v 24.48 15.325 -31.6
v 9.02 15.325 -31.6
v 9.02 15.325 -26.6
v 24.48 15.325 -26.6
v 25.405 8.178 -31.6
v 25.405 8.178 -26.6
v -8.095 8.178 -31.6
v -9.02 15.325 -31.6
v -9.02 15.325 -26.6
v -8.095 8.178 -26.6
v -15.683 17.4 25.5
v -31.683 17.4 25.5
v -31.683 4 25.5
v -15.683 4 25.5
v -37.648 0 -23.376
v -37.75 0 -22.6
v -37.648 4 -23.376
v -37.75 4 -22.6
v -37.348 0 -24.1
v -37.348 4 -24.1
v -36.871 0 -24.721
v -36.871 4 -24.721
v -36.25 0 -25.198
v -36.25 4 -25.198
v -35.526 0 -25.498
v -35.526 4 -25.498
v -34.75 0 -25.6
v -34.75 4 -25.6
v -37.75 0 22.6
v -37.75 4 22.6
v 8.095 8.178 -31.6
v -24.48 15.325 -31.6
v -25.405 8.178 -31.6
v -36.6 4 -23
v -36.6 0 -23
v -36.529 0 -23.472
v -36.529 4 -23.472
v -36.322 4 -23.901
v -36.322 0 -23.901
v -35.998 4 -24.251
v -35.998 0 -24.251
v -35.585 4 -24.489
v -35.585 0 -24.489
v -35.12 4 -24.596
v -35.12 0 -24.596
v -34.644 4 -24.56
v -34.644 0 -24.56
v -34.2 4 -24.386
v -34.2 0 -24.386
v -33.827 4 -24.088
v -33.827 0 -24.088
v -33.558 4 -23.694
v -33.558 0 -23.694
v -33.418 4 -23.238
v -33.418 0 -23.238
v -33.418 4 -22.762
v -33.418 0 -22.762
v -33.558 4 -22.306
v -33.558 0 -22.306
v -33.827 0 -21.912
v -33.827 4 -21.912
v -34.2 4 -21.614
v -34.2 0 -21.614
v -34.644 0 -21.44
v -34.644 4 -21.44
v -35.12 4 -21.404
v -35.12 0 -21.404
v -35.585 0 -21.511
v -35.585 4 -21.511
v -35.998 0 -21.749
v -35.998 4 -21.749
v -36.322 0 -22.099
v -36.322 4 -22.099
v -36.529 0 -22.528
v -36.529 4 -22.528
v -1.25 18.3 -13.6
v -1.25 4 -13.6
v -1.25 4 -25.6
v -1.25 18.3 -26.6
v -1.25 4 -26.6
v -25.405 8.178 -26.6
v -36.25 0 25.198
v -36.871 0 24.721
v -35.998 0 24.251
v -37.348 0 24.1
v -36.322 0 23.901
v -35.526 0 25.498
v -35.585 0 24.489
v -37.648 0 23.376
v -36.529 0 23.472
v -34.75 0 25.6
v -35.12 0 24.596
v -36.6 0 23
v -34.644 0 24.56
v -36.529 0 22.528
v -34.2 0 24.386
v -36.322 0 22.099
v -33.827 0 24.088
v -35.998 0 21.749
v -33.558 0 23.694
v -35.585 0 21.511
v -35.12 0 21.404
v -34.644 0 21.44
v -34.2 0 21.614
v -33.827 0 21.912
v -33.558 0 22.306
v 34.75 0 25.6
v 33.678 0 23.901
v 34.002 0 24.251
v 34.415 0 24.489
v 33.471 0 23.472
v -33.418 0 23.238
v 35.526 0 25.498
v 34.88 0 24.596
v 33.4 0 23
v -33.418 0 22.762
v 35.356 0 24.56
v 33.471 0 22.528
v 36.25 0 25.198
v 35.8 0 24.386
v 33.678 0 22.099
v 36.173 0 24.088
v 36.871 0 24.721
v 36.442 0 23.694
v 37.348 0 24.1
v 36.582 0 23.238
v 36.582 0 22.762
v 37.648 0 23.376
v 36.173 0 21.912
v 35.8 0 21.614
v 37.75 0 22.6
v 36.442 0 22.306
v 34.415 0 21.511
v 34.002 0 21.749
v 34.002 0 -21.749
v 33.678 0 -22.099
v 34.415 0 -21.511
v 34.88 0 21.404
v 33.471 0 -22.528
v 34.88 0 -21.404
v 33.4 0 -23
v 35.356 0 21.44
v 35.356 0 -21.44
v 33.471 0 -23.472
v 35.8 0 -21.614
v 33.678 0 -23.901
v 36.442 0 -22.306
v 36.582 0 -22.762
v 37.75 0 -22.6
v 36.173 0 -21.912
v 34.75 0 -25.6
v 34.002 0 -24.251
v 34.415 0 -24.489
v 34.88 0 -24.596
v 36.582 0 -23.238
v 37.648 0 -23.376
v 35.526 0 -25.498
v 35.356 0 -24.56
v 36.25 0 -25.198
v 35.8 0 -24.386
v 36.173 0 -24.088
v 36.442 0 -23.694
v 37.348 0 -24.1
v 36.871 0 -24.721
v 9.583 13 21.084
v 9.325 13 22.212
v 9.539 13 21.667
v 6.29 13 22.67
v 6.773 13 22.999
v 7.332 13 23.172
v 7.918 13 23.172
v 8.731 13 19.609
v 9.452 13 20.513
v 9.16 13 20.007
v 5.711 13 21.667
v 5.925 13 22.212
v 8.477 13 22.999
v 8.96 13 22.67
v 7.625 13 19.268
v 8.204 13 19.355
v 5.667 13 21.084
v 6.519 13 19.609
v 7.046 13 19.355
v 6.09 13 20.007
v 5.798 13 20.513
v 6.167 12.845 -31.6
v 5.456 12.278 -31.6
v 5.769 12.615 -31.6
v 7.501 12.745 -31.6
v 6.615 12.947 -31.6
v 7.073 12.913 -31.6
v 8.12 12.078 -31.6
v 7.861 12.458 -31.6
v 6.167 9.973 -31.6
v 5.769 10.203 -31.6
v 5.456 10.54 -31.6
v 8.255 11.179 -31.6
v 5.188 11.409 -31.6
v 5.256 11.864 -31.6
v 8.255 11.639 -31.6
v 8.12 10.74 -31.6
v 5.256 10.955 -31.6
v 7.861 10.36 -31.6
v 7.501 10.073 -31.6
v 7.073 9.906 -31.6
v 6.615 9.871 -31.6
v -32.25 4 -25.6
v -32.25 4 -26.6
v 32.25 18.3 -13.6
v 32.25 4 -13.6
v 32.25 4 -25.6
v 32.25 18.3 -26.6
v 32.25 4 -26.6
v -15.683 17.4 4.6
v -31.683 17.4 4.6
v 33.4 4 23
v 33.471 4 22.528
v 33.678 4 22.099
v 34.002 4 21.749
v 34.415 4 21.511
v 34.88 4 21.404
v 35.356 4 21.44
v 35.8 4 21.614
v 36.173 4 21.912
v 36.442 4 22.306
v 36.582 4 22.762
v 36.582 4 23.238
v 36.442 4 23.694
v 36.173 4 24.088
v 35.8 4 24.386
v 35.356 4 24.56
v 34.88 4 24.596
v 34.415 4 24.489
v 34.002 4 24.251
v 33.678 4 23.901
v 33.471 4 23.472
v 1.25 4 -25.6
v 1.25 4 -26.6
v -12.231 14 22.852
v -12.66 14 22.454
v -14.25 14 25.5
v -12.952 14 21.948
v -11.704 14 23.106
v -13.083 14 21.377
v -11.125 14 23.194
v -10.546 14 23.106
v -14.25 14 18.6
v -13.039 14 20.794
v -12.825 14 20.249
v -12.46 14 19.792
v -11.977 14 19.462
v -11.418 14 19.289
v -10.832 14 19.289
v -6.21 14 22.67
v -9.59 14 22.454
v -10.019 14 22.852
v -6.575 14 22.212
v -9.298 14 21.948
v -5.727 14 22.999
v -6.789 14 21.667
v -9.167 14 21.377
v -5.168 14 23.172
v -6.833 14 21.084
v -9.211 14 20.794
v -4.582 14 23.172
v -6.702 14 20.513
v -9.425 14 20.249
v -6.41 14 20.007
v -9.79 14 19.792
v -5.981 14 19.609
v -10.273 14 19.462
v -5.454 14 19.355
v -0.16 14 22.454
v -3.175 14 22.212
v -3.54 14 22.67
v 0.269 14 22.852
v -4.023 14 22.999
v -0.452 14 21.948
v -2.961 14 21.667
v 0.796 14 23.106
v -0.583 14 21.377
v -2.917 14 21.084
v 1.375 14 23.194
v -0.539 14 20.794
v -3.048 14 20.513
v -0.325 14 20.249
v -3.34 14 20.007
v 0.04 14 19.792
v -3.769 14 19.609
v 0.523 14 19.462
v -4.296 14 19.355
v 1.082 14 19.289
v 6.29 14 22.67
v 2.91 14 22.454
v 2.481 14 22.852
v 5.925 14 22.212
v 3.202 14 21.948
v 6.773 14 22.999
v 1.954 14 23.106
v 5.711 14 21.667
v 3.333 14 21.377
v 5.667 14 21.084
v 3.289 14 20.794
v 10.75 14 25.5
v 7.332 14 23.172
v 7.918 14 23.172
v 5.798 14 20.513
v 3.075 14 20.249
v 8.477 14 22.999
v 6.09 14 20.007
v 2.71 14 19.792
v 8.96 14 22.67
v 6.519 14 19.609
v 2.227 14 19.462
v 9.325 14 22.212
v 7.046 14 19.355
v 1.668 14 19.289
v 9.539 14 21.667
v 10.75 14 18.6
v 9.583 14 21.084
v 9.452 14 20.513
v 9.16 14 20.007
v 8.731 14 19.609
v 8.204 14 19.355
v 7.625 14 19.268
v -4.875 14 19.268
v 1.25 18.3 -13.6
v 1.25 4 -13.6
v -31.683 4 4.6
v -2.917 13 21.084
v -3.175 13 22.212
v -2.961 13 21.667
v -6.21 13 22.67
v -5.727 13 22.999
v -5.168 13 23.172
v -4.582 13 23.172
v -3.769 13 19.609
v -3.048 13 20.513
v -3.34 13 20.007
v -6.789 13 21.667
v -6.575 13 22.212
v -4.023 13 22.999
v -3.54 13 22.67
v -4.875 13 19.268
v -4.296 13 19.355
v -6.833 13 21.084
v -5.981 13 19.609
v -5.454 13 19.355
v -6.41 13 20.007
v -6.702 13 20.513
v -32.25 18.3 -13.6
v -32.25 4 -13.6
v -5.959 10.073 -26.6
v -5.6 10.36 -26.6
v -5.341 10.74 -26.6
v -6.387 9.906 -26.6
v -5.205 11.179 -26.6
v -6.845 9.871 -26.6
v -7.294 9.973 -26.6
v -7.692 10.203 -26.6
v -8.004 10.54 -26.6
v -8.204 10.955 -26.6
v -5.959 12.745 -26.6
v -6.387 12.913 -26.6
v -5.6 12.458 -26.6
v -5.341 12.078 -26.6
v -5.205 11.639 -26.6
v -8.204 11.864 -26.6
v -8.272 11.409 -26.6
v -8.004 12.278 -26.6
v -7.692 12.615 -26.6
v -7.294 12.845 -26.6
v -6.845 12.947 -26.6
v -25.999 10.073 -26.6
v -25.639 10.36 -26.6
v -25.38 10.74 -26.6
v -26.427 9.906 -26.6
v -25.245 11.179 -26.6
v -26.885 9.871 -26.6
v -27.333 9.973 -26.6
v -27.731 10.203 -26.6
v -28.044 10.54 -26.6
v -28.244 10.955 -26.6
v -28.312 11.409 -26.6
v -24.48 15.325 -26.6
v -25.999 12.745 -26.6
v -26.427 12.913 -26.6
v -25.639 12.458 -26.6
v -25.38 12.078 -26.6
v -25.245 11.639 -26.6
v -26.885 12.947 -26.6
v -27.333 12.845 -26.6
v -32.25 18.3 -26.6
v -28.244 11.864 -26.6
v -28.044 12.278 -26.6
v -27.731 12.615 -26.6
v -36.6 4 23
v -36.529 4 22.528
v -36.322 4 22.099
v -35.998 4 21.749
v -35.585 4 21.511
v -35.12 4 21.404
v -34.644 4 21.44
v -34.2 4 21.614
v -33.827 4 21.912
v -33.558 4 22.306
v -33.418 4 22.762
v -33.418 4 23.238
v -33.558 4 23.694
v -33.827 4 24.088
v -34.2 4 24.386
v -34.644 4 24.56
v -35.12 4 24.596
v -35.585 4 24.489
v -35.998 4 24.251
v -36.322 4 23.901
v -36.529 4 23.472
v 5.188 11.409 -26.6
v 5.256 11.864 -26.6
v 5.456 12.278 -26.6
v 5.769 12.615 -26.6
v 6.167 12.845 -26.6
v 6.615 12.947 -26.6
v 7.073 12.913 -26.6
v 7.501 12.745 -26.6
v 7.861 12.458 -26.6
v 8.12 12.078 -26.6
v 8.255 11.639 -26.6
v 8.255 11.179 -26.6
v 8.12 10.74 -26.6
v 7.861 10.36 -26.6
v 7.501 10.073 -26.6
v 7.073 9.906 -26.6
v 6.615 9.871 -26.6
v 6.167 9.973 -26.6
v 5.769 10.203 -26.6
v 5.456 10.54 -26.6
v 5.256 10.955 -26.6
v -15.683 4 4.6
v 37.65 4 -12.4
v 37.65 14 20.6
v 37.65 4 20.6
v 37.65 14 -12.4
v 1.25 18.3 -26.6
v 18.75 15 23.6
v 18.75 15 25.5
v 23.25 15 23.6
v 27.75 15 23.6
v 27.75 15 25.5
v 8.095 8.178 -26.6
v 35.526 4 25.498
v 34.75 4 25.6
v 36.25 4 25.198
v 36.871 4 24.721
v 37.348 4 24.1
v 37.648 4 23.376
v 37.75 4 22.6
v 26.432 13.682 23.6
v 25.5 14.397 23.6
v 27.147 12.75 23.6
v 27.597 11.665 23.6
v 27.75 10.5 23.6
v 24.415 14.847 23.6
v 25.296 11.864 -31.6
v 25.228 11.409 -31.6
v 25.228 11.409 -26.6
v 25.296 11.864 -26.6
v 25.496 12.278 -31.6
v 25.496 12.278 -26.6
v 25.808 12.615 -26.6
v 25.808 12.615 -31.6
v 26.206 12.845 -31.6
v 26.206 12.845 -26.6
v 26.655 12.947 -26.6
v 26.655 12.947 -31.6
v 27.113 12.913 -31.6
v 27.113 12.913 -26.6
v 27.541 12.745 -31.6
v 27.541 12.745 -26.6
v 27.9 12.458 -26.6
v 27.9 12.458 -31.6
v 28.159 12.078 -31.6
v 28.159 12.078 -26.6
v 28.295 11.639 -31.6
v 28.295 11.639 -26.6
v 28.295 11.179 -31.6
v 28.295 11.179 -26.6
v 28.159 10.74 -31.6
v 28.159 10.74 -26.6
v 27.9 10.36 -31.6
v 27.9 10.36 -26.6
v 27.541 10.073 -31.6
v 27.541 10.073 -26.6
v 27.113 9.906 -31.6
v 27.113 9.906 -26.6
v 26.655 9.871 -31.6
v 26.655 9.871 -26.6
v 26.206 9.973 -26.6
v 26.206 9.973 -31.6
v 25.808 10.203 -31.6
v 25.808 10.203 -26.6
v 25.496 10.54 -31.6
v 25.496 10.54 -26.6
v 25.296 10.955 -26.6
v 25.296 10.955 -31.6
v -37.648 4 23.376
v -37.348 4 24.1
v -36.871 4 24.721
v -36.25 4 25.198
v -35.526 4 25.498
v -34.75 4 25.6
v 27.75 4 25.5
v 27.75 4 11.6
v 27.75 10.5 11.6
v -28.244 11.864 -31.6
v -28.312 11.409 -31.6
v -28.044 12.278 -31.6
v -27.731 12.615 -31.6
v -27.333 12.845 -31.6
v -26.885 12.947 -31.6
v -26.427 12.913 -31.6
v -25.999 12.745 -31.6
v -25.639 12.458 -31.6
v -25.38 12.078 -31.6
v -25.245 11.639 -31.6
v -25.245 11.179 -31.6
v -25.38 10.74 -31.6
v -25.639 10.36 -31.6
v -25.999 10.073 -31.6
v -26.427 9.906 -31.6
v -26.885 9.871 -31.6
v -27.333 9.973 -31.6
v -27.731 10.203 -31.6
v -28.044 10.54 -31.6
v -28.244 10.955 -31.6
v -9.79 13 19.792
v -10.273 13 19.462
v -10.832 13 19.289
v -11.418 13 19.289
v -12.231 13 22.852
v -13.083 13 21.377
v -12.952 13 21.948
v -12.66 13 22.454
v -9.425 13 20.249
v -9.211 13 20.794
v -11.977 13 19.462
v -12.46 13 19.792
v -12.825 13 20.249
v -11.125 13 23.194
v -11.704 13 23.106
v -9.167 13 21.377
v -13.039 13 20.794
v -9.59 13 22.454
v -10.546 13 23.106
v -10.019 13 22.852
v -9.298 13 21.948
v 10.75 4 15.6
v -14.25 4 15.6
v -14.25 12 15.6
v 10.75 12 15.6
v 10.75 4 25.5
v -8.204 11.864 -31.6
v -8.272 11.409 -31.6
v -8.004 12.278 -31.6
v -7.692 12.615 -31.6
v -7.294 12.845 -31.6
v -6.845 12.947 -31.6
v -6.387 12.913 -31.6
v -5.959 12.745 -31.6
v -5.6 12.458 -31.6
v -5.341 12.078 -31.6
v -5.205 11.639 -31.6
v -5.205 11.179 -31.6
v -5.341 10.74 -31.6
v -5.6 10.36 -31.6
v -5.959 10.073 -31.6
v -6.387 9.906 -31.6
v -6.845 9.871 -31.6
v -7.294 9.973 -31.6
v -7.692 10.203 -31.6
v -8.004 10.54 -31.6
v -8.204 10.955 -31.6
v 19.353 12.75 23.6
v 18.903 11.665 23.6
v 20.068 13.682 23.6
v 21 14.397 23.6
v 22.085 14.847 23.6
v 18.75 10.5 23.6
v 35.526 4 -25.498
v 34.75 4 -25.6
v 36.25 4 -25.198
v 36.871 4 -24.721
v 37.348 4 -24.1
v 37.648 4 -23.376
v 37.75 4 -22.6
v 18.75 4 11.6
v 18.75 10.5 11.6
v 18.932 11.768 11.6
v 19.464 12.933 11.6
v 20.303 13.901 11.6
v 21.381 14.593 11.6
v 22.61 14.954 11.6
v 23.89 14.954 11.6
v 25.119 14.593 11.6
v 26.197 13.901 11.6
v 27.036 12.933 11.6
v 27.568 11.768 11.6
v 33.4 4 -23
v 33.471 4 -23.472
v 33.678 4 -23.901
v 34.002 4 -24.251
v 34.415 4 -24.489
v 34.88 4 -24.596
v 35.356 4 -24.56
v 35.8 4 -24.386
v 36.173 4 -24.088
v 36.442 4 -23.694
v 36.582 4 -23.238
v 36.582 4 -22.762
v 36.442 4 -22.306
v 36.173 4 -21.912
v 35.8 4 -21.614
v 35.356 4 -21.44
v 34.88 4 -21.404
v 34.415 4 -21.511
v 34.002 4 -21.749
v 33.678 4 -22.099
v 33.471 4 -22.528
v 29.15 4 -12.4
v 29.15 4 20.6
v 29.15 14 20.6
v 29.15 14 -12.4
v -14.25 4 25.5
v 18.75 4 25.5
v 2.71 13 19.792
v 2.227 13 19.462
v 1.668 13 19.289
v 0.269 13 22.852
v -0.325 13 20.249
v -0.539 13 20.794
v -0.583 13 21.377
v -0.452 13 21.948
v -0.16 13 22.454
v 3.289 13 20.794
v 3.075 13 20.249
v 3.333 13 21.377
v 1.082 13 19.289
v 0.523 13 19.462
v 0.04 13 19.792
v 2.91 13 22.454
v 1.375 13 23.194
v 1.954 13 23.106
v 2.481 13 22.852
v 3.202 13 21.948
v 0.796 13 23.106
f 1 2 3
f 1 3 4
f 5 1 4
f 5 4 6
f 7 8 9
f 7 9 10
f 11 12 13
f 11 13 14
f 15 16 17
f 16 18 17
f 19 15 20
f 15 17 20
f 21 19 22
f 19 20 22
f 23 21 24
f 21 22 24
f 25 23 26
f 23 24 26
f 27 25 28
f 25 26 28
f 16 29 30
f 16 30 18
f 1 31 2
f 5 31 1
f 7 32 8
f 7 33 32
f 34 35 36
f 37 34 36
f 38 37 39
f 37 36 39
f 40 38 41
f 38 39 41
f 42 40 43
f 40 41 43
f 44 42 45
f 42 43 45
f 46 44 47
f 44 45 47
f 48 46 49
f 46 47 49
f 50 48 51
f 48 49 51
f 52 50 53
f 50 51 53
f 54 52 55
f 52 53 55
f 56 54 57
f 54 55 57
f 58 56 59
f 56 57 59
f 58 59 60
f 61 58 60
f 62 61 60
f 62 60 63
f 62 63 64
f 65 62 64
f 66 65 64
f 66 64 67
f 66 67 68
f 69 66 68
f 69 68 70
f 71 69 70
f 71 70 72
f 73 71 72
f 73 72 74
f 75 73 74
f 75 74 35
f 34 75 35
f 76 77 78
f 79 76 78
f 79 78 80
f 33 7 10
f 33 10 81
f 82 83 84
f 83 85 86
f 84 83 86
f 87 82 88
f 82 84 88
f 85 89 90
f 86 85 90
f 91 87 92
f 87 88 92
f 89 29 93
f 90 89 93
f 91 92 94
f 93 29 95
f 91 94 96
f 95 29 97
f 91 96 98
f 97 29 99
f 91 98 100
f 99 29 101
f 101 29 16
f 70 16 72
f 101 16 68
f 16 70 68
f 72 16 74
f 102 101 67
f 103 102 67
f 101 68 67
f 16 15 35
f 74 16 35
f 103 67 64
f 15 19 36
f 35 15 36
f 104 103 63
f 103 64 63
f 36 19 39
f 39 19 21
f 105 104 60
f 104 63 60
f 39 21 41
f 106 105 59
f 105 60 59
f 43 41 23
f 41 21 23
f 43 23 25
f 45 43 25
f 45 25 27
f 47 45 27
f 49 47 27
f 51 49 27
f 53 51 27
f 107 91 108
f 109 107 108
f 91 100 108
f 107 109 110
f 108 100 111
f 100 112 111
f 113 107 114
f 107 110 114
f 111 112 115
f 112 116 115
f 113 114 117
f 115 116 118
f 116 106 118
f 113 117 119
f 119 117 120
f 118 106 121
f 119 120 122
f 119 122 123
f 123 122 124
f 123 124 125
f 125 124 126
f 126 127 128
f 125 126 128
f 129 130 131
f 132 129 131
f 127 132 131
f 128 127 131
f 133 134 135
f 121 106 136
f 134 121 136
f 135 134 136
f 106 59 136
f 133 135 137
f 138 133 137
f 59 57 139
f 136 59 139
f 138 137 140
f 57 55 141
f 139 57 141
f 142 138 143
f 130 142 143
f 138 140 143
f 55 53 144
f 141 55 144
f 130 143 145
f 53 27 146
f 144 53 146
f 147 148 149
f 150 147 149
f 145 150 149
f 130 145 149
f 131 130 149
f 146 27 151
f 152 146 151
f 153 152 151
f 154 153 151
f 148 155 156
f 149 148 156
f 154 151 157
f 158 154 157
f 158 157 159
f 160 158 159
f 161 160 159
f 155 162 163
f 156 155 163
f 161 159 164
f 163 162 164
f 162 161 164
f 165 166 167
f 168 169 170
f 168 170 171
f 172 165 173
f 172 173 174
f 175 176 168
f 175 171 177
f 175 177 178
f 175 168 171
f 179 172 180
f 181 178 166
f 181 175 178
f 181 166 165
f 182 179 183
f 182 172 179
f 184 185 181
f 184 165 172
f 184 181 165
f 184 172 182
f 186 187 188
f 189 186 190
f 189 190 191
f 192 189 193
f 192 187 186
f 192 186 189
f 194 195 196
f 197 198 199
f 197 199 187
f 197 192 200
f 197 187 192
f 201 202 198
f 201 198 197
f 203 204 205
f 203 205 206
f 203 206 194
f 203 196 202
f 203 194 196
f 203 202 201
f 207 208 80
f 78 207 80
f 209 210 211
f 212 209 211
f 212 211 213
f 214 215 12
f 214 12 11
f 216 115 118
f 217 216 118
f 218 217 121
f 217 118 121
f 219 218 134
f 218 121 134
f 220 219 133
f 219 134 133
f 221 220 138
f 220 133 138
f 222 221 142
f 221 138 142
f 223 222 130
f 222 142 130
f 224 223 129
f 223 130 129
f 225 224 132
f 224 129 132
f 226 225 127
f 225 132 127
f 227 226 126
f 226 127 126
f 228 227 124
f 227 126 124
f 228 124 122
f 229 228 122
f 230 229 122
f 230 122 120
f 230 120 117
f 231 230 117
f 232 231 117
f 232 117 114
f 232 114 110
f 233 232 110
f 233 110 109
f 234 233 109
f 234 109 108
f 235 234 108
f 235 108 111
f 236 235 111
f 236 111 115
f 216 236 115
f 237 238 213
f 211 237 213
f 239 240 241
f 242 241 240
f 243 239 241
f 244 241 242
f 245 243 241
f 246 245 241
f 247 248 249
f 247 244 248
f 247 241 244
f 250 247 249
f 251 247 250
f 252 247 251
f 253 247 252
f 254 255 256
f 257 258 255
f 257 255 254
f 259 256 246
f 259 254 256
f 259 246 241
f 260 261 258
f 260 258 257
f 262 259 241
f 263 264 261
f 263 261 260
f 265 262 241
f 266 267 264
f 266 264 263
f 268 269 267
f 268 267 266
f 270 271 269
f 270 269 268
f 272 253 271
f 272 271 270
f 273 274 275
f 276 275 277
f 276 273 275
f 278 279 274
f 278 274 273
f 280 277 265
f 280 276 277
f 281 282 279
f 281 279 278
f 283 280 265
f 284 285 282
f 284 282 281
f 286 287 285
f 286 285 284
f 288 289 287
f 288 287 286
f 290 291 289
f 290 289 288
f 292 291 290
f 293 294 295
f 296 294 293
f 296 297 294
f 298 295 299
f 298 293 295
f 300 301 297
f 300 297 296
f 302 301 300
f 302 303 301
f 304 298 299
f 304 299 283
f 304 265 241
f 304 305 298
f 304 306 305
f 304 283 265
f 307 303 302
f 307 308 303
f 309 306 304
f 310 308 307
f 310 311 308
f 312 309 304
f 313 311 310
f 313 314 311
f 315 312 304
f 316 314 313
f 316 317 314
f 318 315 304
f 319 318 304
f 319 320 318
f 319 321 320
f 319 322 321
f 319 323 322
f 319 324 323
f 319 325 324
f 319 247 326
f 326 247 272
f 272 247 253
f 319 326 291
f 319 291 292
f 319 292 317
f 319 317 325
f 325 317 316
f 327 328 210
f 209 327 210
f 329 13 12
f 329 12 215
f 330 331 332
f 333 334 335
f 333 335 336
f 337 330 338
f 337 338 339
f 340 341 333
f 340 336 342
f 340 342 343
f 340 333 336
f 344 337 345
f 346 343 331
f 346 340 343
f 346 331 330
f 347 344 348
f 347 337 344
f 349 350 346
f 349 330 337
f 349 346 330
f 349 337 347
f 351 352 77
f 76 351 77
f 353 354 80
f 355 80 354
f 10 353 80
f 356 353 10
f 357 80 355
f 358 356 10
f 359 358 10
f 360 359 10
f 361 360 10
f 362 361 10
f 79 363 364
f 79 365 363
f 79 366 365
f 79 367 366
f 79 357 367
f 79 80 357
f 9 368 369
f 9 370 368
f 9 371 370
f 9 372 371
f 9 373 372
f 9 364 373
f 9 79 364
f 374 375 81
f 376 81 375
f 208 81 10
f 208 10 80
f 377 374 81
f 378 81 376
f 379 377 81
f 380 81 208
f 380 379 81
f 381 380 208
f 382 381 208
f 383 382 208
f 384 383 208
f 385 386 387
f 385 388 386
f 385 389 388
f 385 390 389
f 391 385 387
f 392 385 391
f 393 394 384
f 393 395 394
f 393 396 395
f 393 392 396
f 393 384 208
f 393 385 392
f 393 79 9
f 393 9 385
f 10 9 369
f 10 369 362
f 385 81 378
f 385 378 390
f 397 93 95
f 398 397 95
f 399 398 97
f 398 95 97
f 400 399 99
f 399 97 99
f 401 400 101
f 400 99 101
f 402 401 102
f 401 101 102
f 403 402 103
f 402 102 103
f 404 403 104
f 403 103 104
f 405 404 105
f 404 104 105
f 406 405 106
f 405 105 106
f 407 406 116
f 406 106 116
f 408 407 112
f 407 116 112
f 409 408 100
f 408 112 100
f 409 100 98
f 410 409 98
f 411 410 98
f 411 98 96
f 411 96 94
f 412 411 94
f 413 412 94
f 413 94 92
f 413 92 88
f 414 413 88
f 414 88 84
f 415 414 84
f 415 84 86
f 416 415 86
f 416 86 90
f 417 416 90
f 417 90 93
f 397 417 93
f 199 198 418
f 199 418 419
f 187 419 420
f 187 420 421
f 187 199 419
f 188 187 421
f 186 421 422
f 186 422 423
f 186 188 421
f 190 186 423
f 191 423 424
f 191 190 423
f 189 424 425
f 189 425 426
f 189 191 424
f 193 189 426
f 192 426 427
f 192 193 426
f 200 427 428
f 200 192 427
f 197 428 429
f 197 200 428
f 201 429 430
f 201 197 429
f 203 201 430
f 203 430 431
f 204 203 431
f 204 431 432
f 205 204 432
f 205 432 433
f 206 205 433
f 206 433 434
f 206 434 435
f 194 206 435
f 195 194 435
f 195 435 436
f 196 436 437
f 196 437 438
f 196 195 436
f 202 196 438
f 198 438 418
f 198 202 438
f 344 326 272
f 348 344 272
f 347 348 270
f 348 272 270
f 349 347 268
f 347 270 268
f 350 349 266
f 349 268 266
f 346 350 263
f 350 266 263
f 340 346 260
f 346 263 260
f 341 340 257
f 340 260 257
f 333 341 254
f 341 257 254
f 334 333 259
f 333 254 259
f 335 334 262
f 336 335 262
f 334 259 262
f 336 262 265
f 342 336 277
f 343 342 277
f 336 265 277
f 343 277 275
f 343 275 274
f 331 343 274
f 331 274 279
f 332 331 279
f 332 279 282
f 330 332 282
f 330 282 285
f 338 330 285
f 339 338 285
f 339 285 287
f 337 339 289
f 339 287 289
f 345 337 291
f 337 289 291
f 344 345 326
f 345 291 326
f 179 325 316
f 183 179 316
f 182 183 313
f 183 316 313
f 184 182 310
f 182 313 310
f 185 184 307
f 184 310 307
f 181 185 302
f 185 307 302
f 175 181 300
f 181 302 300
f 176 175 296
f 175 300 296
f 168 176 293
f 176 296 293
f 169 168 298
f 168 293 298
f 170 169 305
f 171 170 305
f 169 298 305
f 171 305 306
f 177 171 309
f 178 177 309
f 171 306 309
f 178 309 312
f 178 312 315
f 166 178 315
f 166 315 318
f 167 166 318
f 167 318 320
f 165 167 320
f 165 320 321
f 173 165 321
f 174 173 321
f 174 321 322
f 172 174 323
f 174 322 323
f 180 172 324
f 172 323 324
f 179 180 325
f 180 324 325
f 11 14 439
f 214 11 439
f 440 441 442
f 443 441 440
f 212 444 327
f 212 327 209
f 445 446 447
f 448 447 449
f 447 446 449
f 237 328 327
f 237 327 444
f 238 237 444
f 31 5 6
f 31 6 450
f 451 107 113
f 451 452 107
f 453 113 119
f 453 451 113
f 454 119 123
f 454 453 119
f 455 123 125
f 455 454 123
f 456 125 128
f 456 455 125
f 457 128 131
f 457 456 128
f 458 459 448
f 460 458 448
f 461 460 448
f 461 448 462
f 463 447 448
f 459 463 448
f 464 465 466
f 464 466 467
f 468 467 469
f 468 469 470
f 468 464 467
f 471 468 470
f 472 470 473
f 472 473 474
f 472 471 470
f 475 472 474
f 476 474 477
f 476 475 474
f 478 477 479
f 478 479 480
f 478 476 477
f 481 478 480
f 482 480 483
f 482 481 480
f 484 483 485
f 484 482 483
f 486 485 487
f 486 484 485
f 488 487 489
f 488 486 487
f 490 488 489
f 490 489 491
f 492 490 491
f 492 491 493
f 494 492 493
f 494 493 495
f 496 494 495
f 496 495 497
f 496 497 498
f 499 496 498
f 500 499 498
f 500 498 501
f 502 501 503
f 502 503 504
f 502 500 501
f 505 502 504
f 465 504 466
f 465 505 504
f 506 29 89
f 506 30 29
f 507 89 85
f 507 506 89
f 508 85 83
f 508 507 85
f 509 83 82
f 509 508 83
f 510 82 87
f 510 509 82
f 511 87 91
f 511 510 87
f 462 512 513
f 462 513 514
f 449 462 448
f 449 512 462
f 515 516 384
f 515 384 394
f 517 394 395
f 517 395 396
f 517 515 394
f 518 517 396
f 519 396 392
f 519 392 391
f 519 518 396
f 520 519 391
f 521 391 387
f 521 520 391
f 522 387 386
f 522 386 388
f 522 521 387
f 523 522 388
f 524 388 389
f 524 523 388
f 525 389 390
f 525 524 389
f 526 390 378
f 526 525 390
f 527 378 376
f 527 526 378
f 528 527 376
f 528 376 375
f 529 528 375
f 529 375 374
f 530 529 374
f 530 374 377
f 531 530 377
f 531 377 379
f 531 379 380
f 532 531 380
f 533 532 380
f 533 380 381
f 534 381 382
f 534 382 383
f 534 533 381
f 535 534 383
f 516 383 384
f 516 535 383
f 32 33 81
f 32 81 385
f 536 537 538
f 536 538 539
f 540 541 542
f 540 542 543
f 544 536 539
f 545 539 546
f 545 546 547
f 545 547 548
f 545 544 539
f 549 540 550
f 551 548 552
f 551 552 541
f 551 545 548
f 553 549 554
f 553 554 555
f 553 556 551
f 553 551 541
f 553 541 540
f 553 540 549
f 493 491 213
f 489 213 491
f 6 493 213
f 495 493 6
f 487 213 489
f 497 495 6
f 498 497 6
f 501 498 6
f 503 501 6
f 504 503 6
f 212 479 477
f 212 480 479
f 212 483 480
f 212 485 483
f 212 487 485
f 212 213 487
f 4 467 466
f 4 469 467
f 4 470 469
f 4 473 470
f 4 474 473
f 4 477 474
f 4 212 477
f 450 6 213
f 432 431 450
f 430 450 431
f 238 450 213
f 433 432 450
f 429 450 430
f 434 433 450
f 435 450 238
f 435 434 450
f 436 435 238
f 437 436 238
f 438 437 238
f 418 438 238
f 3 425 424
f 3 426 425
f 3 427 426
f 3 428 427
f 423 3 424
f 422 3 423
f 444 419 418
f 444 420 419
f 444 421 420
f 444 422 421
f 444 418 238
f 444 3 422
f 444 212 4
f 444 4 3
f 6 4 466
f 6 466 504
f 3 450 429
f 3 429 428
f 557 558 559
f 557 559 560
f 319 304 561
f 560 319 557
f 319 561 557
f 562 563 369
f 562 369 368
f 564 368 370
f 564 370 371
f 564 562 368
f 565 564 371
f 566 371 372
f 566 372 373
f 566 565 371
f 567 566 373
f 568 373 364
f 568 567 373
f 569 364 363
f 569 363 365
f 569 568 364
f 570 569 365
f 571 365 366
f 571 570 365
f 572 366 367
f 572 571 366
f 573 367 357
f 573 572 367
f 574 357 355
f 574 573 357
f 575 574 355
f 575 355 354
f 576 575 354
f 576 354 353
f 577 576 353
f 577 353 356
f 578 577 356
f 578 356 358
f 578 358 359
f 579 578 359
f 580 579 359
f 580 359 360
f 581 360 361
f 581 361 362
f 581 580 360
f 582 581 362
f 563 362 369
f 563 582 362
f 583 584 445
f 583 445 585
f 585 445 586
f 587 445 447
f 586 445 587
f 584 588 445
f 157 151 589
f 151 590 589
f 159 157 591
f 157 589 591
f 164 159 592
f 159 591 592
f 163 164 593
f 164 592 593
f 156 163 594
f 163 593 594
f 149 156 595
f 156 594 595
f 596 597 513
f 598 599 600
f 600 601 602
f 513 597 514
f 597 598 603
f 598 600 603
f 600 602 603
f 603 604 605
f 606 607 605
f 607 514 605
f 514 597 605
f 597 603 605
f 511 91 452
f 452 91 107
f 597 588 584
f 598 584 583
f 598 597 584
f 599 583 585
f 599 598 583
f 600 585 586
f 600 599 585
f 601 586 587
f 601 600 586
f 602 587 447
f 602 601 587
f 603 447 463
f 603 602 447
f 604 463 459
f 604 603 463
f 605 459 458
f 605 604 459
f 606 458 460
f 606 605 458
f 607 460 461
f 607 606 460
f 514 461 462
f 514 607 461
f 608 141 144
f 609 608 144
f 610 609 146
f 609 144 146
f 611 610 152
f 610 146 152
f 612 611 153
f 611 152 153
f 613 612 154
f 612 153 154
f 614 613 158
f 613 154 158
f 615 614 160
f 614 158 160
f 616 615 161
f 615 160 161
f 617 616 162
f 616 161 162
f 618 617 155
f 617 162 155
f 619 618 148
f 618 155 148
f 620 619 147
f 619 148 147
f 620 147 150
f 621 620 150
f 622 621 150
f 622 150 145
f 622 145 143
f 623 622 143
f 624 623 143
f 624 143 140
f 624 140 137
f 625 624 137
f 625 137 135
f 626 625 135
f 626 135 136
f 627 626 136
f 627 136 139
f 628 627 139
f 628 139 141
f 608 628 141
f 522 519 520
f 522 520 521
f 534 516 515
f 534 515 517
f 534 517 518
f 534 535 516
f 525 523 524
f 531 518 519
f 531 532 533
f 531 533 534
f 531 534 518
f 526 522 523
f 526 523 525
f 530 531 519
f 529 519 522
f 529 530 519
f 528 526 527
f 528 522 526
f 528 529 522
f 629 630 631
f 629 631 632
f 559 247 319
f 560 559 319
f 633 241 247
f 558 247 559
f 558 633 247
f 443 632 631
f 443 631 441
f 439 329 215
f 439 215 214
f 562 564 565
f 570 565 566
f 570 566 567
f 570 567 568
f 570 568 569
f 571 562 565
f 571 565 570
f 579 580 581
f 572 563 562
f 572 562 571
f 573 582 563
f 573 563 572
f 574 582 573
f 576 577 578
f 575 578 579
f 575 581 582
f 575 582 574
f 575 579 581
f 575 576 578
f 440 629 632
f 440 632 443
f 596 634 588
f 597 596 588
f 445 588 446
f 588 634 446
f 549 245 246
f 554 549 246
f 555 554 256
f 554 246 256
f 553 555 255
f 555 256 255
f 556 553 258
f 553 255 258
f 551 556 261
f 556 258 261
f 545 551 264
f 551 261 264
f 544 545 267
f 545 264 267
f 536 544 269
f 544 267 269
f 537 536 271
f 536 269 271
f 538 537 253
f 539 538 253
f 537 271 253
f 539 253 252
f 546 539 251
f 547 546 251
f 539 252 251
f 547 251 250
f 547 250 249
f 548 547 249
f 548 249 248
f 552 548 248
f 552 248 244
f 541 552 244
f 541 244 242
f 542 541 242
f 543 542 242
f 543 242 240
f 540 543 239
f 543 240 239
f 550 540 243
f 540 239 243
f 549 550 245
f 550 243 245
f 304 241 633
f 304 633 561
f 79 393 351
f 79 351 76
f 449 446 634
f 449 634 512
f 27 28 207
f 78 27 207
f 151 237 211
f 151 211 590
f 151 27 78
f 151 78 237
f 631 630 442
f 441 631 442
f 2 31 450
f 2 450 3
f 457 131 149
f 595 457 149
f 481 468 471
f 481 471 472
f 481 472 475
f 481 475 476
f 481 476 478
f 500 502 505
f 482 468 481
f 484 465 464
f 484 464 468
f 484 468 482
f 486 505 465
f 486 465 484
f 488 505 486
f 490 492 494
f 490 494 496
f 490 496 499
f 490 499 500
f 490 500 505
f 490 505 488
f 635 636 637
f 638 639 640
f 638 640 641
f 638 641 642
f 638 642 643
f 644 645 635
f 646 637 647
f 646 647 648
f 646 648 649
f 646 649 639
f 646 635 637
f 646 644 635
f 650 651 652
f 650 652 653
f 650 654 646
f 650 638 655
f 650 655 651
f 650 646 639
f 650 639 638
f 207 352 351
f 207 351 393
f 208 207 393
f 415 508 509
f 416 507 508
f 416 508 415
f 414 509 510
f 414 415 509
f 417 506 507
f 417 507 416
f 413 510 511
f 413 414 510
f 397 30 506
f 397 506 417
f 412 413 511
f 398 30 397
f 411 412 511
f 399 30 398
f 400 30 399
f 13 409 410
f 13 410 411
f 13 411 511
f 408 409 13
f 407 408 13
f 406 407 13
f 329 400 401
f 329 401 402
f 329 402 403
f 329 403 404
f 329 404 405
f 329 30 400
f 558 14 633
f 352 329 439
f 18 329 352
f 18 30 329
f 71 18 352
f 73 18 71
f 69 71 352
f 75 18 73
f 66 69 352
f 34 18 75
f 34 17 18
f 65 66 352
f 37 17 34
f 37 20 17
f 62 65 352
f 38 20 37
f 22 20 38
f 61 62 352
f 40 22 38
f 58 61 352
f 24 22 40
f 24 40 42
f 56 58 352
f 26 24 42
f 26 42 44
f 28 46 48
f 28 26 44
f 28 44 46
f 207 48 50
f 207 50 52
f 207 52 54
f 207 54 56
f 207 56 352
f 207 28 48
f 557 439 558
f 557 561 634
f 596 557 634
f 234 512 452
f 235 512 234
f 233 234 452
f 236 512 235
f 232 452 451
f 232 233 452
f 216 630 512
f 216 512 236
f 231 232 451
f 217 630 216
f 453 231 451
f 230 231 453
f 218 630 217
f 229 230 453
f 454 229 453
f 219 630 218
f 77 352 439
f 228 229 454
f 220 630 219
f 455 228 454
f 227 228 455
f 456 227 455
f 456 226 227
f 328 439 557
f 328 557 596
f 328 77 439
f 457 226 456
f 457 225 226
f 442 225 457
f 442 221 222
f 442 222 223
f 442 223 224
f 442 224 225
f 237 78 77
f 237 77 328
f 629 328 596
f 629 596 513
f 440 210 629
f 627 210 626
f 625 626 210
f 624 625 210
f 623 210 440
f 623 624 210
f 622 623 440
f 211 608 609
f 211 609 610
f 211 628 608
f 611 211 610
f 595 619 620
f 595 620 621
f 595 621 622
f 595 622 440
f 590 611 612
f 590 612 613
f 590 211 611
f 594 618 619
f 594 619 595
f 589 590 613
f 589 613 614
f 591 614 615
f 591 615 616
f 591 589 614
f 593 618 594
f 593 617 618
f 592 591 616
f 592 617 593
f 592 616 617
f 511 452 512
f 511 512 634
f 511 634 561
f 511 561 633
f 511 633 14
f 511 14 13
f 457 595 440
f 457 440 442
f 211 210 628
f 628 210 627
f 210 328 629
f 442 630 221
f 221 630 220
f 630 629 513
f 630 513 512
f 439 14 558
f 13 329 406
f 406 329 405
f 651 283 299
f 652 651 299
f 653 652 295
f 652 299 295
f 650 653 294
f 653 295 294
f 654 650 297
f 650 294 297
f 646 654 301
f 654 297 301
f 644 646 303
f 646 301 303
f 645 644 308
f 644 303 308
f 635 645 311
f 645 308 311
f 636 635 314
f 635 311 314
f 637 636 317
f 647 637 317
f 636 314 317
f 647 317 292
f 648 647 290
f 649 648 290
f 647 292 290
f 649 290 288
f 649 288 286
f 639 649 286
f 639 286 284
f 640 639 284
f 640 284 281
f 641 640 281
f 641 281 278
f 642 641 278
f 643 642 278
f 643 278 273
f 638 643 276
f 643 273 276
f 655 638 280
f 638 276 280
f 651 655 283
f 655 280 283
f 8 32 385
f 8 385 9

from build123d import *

# Parameters (mm, degrees)
SKETCH_1_W          = 75.5
SKETCH_1_H          = 51.2
EXTRUDE_1_DEPTH     = 4
HOLE_WIZARD_M3_1_D  = 3.2
FILLET_1_R          = 3
SKETCH_4_W          = 9
SKETCH_4_H          = 11
EXTRUDE_2_DEPTH     = 14
CUT_EXTRUDE_1_DEPTH = 12
SKETCH_6_W          = 25
SKETCH_6_H          = 10
EXTRUDE_3_DEPTH     = 10
SKETCH_7_R          = 1.963016799
CUT_EXTRUDE_2_DEPTH = 1
CHAMFER_1_SIZE      = 2
CHAMFER_1_SIZE2     = 3
SKETCH_8_W          = 8.6
SKETCH_8_H          = 33
EXTRUDE_4_DEPTH     = 10
SKETCH_9_W          = 31
SKETCH_9_H          = 18
EXTRUDE_5_DEPTH     = 14.3
SKETCH_10_W         = 31
SKETCH_10_H         = 14.3
SKETCH_10_R         = 1.542197262
CUT_EXTRUDE_3_DEPTH = 5
SKETCH_11_W         = 16
SKETCH_11_H         = 21
EXTRUDE_6_DEPTH     = 13.4
SKETCH_12_W         = 59.433168898
SKETCH_12_H         = 13.4
CUT_EXTRUDE_4_DEPTH = 0.1
SKETCH_13_W         = 33
SKETCH_13_H         = 10
CUT_EXTRUDE_5_DEPTH = 0.1


with BuildPart() as part:
    # 草图1 → 凸台-拉伸1 (new body)
    with BuildSketch(Plane(origin=(0, 0, 0), x_dir=(1, 0, 0), z_dir=(0, 1, 0))):
        Rectangle(SKETCH_1_W, SKETCH_1_H)
    extrude(amount=EXTRUDE_1_DEPTH)

    # M3 间隙孔1 (through all)
    with Locations(Plane(origin=(0, 4, 0), x_dir=(1, 0, 0), z_dir=(0, 1, 0))):
        with Locations((-35, 23), (35, 23), (-35, -23), (35, -23)):
            Hole(HOLE_WIZARD_M3_1_D / 2)

    # 圆角1
    fillet_1_edges = [part.edges().sort_by_distance(p)[0] for p in [
        (-37.75, 2, -25.6),
        (37.75, 2, -25.6),
        (37.75, 2, 25.6),
        (-37.75, 2, 25.6),
    ]]
    fillet(fillet_1_edges, radius=FILLET_1_R)

    # 草图4 → 凸台-拉伸2 (add)
    with BuildSketch(Plane.XY.offset(25.6)):
        with Locations((23.25, 9.5)):
            Rectangle(SKETCH_4_W, SKETCH_4_H)
    extrude(amount=-EXTRUDE_2_DEPTH)

    # 草图5 → 切除-拉伸1 (cut)
    with BuildSketch(Plane(origin=(0, 0, 11.6), x_dir=(-1, 0, 0), z_dir=(0, 0, -1))):
        with BuildLine():
            Line((-27.75, 10.5), (-28.75, 10.5))
            Line((-28.75, 10.5), (-28.75, 16))
            Line((-28.75, 16), (-17.75, 16))
            Line((-17.75, 16), (-17.75, 10.5))
            Line((-17.75, 10.5), (-18.75, 10.5))
            ThreePointArc((-18.75, 10.5), (-23.25, 15), (-27.75, 10.5))
        make_face()
    extrude(amount=-CUT_EXTRUDE_1_DEPTH, mode=Mode.SUBTRACT)

    # 草图6 → 凸台-拉伸3 (add)
    with BuildSketch(Plane(origin=(0, 4, 0), x_dir=(1, 0, 0), z_dir=(0, 1, 0))):
        with Locations((-1.75, -20.6)):
            Rectangle(SKETCH_6_W, SKETCH_6_H)
    extrude(amount=EXTRUDE_3_DEPTH)

    # 草图7 → 切除-拉伸2 (cut)
    with BuildSketch(Plane(origin=(0, 14, 0), x_dir=(1, 0, 0), z_dir=(0, 1, 0))):
        with Locations(Location((-11.125, -21.230534839, 0), (0, 0, 270))):
            Circle(SKETCH_7_R)
        with Locations(Location((-4.875, -21.230534839, 0), (0, 0, 90))):
            Circle(SKETCH_7_R)
        with Locations(Location((7.625, -21.230534839, 0), (0, 0, 90))):
            Circle(SKETCH_7_R)
        with Locations(Location((1.375, -21.230534839, 0), (0, 0, 270))):
            Circle(SKETCH_7_R)
    extrude(amount=-CUT_EXTRUDE_2_DEPTH, mode=Mode.SUBTRACT)

    # 倒角1
    chamfer_1_edges = [part.edges().sort_by_distance(p)[0] for p in [
        (-1.75, 14, 15.6),
    ]]
    chamfer_1_side = [part.faces().sort_by_distance(p)[0] for p in [
        (-1.75, 9, 15.6),
    ]]
    chamfer(chamfer_1_edges, length=CHAMFER_1_SIZE, length2=CHAMFER_1_SIZE2, reference=chamfer_1_side[0])

    # 草图8 → 凸台-拉伸4 (add)
    with BuildSketch(Plane(origin=(0, 4, 0), x_dir=(1, 0, 0), z_dir=(0, 1, 0))):
        with Locations((33.45, -4.1)):
            Rectangle(SKETCH_8_W, SKETCH_8_H)
    extrude(amount=EXTRUDE_4_DEPTH)

    # 草图9 → 凸台-拉伸5 (add)
    with BuildSketch(Plane(origin=(0, 4, 0), x_dir=(1, 0, 0), z_dir=(0, 1, 0))):
        with Locations((-16.75, 22.6)):
            Rectangle(SKETCH_9_W, SKETCH_9_H)
        with Locations((16.75, 22.6)):
            Rectangle(SKETCH_9_W, SKETCH_9_H)
    extrude(amount=EXTRUDE_5_DEPTH)

    # 草图10 → 切除-拉伸3 (cut)
    # profile 1 of 2: a face of its own
    with BuildSketch(Plane(origin=(0, 0, -31.6), x_dir=(-1, 0, 0), z_dir=(0, 0, -1))):
        with Locations((-16.75, 11.15)):
            Rectangle(SKETCH_10_W, SKETCH_10_H)
        with Locations((-26.769914648, 11.409080509)):
            Circle(SKETCH_10_R, mode=Mode.SUBTRACT)
        with Locations((-6.730085352, 11.409080509)):
            Circle(SKETCH_10_R, mode=Mode.SUBTRACT)
        Polygon((-25.404607637, 8.177619476), (-8.095392363, 8.177619476), (-9.020301502, 15.325154661), (-24.479698498, 15.325154661), align=None, mode=Mode.SUBTRACT)
    # profile 2 of 2: a face of its own
    with BuildSketch(Plane(origin=(0, 0, -31.6), x_dir=(-1, 0, 0), z_dir=(0, 0, -1))):
        with Locations((16.75, 11.15)):
            Rectangle(SKETCH_10_W, SKETCH_10_H)
        with Locations((6.730085352, 11.409080509)):
            Circle(SKETCH_10_R, mode=Mode.SUBTRACT)
        with Locations((26.769914648, 11.409080509)):
            Circle(SKETCH_10_R, mode=Mode.SUBTRACT)
        Polygon((9.020301502, 15.325154661), (8.095392363, 8.177619476), (25.404607637, 8.177619476), (24.479698498, 15.325154661), align=None, mode=Mode.SUBTRACT)
    extrude(amount=-CUT_EXTRUDE_3_DEPTH, mode=Mode.SUBTRACT)

    # 草图11 → 凸台-拉伸6 (add)
    with BuildSketch(Plane(origin=(0, 4, 0), x_dir=(1, 0, 0), z_dir=(0, 1, 0))):
        with Locations((-23.683168898, -15.1)):
            Rectangle(SKETCH_11_W, SKETCH_11_H)
    extrude(amount=EXTRUDE_6_DEPTH)

    # 草图12 → 切除-拉伸4 (cut)
    with BuildSketch(Plane.XY.offset(25.6)):
        with Locations((-1.966584449, 10.7)):
            Rectangle(SKETCH_12_W, SKETCH_12_H)
    extrude(amount=-CUT_EXTRUDE_4_DEPTH, mode=Mode.SUBTRACT)

    # 草图13 → 切除-拉伸5 (cut)
    with BuildSketch(Plane(origin=(37.75, 0, 0), x_dir=(0, 0, -1), z_dir=(1, 0, 0))):
        with Locations((-4.1, 9)):
            Rectangle(SKETCH_13_W, SKETCH_13_H)
    extrude(amount=-CUT_EXTRUDE_5_DEPTH, mode=Mode.SUBTRACT)


solid = part.part
